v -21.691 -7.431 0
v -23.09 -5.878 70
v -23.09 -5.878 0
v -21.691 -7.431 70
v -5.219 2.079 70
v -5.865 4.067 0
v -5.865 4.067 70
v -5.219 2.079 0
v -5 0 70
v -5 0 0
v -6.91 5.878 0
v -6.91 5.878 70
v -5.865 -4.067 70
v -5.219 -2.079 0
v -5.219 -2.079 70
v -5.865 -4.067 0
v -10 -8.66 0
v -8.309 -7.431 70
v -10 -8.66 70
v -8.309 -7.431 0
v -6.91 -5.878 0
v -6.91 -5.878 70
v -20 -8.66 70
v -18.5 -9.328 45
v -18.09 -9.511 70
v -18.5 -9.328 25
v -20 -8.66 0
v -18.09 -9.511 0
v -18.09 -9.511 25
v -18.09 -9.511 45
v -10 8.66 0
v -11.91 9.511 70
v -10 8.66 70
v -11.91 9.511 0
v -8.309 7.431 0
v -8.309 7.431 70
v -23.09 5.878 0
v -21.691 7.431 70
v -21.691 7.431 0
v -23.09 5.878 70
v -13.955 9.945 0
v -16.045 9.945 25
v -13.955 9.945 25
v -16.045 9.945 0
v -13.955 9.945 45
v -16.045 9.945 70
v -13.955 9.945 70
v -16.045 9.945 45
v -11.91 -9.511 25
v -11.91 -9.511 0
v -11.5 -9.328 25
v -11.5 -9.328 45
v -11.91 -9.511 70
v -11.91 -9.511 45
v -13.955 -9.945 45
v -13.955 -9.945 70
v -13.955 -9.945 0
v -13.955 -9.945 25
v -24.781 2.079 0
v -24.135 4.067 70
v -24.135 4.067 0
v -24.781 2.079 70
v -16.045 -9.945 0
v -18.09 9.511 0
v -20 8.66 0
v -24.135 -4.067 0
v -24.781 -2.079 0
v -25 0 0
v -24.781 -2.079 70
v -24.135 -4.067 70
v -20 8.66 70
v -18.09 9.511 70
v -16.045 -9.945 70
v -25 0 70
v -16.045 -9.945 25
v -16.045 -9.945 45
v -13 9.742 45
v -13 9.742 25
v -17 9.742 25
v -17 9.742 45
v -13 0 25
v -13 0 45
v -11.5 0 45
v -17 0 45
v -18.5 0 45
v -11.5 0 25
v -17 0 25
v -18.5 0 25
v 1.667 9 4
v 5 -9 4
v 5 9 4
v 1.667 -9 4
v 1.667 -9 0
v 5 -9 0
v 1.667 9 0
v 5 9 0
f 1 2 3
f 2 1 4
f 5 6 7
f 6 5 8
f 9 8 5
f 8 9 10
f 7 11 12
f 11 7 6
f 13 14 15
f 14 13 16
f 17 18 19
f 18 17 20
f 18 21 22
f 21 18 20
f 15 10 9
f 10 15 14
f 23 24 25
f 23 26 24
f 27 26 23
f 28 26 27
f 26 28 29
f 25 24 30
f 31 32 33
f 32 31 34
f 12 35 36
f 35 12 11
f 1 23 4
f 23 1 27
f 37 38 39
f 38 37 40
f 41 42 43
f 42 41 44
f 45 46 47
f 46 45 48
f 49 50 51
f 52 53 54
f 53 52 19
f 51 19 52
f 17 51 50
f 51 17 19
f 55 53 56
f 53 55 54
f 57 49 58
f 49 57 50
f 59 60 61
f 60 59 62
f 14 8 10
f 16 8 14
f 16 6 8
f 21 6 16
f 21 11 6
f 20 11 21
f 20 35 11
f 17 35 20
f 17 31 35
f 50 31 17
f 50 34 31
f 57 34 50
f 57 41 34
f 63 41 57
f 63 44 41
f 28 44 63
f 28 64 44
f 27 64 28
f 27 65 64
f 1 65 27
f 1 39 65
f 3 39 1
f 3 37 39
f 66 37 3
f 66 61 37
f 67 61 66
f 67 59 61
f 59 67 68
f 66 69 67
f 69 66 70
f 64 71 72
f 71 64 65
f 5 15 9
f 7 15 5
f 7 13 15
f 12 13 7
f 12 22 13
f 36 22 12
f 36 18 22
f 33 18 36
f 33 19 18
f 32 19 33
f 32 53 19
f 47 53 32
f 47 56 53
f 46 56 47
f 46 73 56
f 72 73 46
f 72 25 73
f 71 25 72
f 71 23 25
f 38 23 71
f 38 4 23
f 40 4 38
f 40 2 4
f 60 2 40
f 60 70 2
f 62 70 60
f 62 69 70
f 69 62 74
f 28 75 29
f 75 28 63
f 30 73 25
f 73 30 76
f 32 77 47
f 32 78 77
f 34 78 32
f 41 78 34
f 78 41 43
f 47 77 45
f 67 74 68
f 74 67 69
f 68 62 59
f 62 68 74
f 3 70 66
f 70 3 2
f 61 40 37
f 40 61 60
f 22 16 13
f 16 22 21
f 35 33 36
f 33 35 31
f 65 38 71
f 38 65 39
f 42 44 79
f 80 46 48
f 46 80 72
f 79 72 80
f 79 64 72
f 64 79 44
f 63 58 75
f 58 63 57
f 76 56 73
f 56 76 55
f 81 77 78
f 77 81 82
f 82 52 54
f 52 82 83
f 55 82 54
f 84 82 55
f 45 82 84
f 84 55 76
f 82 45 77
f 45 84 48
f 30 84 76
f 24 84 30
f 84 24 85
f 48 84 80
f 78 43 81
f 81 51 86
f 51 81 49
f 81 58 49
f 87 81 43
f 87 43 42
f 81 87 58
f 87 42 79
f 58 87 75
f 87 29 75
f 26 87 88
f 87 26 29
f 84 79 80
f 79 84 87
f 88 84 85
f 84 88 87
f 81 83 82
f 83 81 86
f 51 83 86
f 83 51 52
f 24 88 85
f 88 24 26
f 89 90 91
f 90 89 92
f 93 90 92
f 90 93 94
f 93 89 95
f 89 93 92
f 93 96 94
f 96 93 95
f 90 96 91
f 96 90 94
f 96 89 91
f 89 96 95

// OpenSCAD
/**************************************************/
/* Crée par: Rom1 - CANEL - https://www.canel.ch  */
/* Date: 17 juillet 2017                          */
/* Liscence: Creative Commons: (BY SA)            */
/*           Attribution - Partage dans les Mêmes */
/*           Conditions 4.0 International.        */
/* Programme: openscad                            */
/* Déscription: Poignée pour un lit Ikea          */
/**************************************************/


/*************/
/* Variables */
/*************/

/* 1: Poignée */
/* 2: Encoche */
/* 0: les 2 pièces */
pieces = 0;

/* Dimention de la poignée */
hauteur = 70;
diametre = 20;

/* Ouverture pour l'encoche */
ouverture_x_min = 4;
ouverture_x_max = 7;
ouverture_z = 20;

/* Type encoche     */
/* 1: rectangulaire */
/* 2: rond          */
enc = 1;

/* Epaisseur de l'encoche */
epaisseur = 4;


/***********/
/* Modules */
/***********/

/* Poignée */
module poignee(){
	difference(){
		cylinder(hauteur, d=diametre);
		translate([-ouverture_x_min/2, 0, hauteur/2-ouverture_z/2]) cube([ouverture_x_min, diametre, ouverture_z]);
		translate([-ouverture_x_max/2, -diametre, hauteur/2-ouverture_z/2]) cube([ouverture_x_max, diametre, ouverture_z]);
	}
}

/* Encoche */
module encoche(){
	if(enc == 1){
		cube([ouverture_z-2, diametre/6, epaisseur]);
	}
	if(enc == 2){
		cylinder(ouverture_z-2, d=epaisseur, $fn=60);
	}
}

/***********************/
/* Programme principal */
/***********************/

if(pieces == 1){
	poignee();
}
if(pieces == 2){
	encoche();
}
if(pieces == 0){
	translate([-diametre/2-5, 0, 0]) poignee();
	translate([5, -(ouverture_z-2)/2, 0]) rotate([0, 0, 90]) encoche();
}
